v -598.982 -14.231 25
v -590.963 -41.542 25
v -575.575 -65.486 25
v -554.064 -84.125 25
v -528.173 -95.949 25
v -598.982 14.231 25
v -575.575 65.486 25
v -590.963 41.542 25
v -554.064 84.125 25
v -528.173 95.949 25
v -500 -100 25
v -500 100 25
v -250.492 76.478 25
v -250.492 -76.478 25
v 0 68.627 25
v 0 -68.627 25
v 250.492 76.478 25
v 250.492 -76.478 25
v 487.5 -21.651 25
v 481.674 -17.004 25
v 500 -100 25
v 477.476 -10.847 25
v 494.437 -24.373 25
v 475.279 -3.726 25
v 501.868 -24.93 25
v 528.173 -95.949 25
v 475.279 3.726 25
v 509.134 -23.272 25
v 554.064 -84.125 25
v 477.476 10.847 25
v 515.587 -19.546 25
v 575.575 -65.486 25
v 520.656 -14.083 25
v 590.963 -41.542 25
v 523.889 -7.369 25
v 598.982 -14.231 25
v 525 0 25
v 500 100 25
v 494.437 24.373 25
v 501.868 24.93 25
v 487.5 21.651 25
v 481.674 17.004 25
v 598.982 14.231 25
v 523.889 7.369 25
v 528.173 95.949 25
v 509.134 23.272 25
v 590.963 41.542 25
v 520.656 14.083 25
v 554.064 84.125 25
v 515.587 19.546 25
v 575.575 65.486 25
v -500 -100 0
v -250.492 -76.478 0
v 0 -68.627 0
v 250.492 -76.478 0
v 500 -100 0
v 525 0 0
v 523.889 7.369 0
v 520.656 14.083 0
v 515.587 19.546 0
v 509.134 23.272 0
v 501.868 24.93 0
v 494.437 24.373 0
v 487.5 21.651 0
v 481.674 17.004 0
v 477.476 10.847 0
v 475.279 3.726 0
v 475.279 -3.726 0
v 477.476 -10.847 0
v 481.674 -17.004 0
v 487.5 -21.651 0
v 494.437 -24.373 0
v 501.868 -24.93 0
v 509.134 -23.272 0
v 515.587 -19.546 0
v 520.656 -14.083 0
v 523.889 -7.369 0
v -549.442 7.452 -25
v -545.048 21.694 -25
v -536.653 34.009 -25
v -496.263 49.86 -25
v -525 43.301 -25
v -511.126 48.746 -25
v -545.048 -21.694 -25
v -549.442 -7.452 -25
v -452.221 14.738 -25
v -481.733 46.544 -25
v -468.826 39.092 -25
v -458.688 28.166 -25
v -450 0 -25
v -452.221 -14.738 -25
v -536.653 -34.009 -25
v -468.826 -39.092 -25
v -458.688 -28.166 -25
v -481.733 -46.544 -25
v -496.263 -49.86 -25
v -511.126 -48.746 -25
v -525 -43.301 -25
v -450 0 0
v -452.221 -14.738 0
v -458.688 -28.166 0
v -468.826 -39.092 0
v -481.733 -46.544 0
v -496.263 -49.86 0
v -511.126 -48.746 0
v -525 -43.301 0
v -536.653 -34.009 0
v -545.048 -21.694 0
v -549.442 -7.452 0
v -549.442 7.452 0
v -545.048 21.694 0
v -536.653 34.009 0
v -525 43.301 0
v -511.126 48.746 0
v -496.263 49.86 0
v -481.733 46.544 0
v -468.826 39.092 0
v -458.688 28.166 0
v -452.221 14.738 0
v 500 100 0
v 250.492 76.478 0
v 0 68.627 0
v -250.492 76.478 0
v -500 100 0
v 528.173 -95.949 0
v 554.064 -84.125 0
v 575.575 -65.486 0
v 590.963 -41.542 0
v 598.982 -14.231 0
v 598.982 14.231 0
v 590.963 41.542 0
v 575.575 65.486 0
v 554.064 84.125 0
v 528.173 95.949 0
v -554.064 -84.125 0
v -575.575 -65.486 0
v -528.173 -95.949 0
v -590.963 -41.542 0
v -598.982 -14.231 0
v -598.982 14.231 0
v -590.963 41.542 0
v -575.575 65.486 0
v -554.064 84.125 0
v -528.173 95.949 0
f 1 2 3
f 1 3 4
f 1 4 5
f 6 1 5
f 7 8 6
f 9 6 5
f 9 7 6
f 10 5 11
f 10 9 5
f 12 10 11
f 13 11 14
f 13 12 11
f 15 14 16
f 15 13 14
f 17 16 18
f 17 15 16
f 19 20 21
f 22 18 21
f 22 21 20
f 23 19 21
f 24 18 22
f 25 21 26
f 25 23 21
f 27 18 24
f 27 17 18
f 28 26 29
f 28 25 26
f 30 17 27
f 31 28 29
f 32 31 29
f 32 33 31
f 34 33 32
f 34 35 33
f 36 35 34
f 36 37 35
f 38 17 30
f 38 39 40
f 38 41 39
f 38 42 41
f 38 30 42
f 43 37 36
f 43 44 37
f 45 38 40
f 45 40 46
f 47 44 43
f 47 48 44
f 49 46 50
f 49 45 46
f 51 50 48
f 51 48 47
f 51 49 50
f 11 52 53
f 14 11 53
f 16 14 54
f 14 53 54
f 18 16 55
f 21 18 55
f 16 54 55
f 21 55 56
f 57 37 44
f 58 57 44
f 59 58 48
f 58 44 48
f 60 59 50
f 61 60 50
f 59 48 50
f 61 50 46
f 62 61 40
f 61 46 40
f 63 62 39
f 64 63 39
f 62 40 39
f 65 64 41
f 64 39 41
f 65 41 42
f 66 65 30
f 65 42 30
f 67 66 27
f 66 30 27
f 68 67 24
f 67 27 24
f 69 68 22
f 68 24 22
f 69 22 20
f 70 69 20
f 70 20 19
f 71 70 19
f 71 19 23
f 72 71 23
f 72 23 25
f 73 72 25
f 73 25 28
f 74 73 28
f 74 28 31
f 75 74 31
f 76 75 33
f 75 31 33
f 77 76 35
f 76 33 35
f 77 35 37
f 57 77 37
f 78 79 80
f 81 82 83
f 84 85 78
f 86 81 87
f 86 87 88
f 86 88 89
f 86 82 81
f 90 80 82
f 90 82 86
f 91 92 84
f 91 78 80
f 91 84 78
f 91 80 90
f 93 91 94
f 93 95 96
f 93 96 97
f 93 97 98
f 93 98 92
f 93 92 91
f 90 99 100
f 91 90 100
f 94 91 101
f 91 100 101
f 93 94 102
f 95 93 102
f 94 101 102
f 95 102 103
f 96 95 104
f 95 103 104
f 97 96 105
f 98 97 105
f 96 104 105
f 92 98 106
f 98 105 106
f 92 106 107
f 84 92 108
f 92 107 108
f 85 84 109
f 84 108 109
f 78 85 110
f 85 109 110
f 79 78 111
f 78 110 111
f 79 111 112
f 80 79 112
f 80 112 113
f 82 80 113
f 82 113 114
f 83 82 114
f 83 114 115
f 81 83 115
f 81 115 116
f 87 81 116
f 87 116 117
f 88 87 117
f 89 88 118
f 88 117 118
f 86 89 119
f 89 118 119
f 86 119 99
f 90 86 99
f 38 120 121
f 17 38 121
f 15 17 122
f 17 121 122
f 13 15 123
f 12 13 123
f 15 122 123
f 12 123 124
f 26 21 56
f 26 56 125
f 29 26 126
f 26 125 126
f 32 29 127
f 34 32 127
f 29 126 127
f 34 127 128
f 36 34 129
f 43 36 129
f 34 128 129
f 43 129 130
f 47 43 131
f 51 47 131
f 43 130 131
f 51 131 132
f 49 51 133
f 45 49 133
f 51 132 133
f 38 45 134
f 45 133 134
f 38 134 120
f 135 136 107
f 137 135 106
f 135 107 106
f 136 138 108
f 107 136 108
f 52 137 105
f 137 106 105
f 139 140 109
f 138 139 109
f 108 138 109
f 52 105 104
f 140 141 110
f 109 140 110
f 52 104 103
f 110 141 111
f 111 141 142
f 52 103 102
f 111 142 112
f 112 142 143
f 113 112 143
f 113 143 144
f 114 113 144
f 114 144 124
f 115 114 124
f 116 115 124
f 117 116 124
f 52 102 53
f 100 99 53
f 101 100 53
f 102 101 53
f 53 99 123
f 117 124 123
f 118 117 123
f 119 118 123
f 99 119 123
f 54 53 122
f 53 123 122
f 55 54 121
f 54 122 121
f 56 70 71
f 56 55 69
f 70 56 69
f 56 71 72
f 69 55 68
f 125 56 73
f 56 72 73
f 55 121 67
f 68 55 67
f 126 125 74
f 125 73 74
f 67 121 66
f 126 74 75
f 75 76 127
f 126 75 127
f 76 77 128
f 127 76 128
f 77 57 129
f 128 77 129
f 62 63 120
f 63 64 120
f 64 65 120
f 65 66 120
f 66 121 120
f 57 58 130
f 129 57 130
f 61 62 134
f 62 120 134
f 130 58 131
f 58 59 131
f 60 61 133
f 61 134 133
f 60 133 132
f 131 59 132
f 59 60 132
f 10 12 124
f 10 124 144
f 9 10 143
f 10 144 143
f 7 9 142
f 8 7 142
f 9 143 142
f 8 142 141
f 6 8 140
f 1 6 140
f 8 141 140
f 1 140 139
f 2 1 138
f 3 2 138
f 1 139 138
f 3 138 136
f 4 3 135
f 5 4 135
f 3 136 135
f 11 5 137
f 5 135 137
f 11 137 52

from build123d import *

# Parameters (mm, degrees)
BOSS_EXTRUDE1_DEPTH = 25
SKETCH2_R           = 50
BOSS_EXTRUDE2_DEPTH = 25
SKETCH3_R           = 25
CUT_EXTRUDE2_DEPTH  = 25


with BuildPart() as part:
    # Sketch1 → Boss-Extrude1 (new body)
    with BuildSketch(Plane.XY):
        with BuildLine():
            ThreePointArc((-500, 100), (-600, 0), (-500, -100))
            ThreePointArc((-500, -100), (0, -68.626966597), (500, -100))
            ThreePointArc((500, -100), (600, 0), (500, 100))
            ThreePointArc((500, 100), (0, 68.626966597), (-500, 100))
        make_face()
    extrude(amount=BOSS_EXTRUDE1_DEPTH)

    # Sketch2 → Boss-Extrude2 (add)
    with BuildSketch(Plane(origin=(0, 0, 0), x_dir=(1, 0, 0), z_dir=(0, 0, -1))):
        with Locations((-500, 0)):
            Circle(SKETCH2_R)
    extrude(amount=BOSS_EXTRUDE2_DEPTH)

    # Sketch3 → Cut-Extrude2 (cut)
    with BuildSketch(Plane.XY.offset(25)):
        with Locations((500, 0)):
            Circle(SKETCH3_R)
    extrude(amount=-CUT_EXTRUDE2_DEPTH, mode=Mode.SUBTRACT)


solid = part.part
